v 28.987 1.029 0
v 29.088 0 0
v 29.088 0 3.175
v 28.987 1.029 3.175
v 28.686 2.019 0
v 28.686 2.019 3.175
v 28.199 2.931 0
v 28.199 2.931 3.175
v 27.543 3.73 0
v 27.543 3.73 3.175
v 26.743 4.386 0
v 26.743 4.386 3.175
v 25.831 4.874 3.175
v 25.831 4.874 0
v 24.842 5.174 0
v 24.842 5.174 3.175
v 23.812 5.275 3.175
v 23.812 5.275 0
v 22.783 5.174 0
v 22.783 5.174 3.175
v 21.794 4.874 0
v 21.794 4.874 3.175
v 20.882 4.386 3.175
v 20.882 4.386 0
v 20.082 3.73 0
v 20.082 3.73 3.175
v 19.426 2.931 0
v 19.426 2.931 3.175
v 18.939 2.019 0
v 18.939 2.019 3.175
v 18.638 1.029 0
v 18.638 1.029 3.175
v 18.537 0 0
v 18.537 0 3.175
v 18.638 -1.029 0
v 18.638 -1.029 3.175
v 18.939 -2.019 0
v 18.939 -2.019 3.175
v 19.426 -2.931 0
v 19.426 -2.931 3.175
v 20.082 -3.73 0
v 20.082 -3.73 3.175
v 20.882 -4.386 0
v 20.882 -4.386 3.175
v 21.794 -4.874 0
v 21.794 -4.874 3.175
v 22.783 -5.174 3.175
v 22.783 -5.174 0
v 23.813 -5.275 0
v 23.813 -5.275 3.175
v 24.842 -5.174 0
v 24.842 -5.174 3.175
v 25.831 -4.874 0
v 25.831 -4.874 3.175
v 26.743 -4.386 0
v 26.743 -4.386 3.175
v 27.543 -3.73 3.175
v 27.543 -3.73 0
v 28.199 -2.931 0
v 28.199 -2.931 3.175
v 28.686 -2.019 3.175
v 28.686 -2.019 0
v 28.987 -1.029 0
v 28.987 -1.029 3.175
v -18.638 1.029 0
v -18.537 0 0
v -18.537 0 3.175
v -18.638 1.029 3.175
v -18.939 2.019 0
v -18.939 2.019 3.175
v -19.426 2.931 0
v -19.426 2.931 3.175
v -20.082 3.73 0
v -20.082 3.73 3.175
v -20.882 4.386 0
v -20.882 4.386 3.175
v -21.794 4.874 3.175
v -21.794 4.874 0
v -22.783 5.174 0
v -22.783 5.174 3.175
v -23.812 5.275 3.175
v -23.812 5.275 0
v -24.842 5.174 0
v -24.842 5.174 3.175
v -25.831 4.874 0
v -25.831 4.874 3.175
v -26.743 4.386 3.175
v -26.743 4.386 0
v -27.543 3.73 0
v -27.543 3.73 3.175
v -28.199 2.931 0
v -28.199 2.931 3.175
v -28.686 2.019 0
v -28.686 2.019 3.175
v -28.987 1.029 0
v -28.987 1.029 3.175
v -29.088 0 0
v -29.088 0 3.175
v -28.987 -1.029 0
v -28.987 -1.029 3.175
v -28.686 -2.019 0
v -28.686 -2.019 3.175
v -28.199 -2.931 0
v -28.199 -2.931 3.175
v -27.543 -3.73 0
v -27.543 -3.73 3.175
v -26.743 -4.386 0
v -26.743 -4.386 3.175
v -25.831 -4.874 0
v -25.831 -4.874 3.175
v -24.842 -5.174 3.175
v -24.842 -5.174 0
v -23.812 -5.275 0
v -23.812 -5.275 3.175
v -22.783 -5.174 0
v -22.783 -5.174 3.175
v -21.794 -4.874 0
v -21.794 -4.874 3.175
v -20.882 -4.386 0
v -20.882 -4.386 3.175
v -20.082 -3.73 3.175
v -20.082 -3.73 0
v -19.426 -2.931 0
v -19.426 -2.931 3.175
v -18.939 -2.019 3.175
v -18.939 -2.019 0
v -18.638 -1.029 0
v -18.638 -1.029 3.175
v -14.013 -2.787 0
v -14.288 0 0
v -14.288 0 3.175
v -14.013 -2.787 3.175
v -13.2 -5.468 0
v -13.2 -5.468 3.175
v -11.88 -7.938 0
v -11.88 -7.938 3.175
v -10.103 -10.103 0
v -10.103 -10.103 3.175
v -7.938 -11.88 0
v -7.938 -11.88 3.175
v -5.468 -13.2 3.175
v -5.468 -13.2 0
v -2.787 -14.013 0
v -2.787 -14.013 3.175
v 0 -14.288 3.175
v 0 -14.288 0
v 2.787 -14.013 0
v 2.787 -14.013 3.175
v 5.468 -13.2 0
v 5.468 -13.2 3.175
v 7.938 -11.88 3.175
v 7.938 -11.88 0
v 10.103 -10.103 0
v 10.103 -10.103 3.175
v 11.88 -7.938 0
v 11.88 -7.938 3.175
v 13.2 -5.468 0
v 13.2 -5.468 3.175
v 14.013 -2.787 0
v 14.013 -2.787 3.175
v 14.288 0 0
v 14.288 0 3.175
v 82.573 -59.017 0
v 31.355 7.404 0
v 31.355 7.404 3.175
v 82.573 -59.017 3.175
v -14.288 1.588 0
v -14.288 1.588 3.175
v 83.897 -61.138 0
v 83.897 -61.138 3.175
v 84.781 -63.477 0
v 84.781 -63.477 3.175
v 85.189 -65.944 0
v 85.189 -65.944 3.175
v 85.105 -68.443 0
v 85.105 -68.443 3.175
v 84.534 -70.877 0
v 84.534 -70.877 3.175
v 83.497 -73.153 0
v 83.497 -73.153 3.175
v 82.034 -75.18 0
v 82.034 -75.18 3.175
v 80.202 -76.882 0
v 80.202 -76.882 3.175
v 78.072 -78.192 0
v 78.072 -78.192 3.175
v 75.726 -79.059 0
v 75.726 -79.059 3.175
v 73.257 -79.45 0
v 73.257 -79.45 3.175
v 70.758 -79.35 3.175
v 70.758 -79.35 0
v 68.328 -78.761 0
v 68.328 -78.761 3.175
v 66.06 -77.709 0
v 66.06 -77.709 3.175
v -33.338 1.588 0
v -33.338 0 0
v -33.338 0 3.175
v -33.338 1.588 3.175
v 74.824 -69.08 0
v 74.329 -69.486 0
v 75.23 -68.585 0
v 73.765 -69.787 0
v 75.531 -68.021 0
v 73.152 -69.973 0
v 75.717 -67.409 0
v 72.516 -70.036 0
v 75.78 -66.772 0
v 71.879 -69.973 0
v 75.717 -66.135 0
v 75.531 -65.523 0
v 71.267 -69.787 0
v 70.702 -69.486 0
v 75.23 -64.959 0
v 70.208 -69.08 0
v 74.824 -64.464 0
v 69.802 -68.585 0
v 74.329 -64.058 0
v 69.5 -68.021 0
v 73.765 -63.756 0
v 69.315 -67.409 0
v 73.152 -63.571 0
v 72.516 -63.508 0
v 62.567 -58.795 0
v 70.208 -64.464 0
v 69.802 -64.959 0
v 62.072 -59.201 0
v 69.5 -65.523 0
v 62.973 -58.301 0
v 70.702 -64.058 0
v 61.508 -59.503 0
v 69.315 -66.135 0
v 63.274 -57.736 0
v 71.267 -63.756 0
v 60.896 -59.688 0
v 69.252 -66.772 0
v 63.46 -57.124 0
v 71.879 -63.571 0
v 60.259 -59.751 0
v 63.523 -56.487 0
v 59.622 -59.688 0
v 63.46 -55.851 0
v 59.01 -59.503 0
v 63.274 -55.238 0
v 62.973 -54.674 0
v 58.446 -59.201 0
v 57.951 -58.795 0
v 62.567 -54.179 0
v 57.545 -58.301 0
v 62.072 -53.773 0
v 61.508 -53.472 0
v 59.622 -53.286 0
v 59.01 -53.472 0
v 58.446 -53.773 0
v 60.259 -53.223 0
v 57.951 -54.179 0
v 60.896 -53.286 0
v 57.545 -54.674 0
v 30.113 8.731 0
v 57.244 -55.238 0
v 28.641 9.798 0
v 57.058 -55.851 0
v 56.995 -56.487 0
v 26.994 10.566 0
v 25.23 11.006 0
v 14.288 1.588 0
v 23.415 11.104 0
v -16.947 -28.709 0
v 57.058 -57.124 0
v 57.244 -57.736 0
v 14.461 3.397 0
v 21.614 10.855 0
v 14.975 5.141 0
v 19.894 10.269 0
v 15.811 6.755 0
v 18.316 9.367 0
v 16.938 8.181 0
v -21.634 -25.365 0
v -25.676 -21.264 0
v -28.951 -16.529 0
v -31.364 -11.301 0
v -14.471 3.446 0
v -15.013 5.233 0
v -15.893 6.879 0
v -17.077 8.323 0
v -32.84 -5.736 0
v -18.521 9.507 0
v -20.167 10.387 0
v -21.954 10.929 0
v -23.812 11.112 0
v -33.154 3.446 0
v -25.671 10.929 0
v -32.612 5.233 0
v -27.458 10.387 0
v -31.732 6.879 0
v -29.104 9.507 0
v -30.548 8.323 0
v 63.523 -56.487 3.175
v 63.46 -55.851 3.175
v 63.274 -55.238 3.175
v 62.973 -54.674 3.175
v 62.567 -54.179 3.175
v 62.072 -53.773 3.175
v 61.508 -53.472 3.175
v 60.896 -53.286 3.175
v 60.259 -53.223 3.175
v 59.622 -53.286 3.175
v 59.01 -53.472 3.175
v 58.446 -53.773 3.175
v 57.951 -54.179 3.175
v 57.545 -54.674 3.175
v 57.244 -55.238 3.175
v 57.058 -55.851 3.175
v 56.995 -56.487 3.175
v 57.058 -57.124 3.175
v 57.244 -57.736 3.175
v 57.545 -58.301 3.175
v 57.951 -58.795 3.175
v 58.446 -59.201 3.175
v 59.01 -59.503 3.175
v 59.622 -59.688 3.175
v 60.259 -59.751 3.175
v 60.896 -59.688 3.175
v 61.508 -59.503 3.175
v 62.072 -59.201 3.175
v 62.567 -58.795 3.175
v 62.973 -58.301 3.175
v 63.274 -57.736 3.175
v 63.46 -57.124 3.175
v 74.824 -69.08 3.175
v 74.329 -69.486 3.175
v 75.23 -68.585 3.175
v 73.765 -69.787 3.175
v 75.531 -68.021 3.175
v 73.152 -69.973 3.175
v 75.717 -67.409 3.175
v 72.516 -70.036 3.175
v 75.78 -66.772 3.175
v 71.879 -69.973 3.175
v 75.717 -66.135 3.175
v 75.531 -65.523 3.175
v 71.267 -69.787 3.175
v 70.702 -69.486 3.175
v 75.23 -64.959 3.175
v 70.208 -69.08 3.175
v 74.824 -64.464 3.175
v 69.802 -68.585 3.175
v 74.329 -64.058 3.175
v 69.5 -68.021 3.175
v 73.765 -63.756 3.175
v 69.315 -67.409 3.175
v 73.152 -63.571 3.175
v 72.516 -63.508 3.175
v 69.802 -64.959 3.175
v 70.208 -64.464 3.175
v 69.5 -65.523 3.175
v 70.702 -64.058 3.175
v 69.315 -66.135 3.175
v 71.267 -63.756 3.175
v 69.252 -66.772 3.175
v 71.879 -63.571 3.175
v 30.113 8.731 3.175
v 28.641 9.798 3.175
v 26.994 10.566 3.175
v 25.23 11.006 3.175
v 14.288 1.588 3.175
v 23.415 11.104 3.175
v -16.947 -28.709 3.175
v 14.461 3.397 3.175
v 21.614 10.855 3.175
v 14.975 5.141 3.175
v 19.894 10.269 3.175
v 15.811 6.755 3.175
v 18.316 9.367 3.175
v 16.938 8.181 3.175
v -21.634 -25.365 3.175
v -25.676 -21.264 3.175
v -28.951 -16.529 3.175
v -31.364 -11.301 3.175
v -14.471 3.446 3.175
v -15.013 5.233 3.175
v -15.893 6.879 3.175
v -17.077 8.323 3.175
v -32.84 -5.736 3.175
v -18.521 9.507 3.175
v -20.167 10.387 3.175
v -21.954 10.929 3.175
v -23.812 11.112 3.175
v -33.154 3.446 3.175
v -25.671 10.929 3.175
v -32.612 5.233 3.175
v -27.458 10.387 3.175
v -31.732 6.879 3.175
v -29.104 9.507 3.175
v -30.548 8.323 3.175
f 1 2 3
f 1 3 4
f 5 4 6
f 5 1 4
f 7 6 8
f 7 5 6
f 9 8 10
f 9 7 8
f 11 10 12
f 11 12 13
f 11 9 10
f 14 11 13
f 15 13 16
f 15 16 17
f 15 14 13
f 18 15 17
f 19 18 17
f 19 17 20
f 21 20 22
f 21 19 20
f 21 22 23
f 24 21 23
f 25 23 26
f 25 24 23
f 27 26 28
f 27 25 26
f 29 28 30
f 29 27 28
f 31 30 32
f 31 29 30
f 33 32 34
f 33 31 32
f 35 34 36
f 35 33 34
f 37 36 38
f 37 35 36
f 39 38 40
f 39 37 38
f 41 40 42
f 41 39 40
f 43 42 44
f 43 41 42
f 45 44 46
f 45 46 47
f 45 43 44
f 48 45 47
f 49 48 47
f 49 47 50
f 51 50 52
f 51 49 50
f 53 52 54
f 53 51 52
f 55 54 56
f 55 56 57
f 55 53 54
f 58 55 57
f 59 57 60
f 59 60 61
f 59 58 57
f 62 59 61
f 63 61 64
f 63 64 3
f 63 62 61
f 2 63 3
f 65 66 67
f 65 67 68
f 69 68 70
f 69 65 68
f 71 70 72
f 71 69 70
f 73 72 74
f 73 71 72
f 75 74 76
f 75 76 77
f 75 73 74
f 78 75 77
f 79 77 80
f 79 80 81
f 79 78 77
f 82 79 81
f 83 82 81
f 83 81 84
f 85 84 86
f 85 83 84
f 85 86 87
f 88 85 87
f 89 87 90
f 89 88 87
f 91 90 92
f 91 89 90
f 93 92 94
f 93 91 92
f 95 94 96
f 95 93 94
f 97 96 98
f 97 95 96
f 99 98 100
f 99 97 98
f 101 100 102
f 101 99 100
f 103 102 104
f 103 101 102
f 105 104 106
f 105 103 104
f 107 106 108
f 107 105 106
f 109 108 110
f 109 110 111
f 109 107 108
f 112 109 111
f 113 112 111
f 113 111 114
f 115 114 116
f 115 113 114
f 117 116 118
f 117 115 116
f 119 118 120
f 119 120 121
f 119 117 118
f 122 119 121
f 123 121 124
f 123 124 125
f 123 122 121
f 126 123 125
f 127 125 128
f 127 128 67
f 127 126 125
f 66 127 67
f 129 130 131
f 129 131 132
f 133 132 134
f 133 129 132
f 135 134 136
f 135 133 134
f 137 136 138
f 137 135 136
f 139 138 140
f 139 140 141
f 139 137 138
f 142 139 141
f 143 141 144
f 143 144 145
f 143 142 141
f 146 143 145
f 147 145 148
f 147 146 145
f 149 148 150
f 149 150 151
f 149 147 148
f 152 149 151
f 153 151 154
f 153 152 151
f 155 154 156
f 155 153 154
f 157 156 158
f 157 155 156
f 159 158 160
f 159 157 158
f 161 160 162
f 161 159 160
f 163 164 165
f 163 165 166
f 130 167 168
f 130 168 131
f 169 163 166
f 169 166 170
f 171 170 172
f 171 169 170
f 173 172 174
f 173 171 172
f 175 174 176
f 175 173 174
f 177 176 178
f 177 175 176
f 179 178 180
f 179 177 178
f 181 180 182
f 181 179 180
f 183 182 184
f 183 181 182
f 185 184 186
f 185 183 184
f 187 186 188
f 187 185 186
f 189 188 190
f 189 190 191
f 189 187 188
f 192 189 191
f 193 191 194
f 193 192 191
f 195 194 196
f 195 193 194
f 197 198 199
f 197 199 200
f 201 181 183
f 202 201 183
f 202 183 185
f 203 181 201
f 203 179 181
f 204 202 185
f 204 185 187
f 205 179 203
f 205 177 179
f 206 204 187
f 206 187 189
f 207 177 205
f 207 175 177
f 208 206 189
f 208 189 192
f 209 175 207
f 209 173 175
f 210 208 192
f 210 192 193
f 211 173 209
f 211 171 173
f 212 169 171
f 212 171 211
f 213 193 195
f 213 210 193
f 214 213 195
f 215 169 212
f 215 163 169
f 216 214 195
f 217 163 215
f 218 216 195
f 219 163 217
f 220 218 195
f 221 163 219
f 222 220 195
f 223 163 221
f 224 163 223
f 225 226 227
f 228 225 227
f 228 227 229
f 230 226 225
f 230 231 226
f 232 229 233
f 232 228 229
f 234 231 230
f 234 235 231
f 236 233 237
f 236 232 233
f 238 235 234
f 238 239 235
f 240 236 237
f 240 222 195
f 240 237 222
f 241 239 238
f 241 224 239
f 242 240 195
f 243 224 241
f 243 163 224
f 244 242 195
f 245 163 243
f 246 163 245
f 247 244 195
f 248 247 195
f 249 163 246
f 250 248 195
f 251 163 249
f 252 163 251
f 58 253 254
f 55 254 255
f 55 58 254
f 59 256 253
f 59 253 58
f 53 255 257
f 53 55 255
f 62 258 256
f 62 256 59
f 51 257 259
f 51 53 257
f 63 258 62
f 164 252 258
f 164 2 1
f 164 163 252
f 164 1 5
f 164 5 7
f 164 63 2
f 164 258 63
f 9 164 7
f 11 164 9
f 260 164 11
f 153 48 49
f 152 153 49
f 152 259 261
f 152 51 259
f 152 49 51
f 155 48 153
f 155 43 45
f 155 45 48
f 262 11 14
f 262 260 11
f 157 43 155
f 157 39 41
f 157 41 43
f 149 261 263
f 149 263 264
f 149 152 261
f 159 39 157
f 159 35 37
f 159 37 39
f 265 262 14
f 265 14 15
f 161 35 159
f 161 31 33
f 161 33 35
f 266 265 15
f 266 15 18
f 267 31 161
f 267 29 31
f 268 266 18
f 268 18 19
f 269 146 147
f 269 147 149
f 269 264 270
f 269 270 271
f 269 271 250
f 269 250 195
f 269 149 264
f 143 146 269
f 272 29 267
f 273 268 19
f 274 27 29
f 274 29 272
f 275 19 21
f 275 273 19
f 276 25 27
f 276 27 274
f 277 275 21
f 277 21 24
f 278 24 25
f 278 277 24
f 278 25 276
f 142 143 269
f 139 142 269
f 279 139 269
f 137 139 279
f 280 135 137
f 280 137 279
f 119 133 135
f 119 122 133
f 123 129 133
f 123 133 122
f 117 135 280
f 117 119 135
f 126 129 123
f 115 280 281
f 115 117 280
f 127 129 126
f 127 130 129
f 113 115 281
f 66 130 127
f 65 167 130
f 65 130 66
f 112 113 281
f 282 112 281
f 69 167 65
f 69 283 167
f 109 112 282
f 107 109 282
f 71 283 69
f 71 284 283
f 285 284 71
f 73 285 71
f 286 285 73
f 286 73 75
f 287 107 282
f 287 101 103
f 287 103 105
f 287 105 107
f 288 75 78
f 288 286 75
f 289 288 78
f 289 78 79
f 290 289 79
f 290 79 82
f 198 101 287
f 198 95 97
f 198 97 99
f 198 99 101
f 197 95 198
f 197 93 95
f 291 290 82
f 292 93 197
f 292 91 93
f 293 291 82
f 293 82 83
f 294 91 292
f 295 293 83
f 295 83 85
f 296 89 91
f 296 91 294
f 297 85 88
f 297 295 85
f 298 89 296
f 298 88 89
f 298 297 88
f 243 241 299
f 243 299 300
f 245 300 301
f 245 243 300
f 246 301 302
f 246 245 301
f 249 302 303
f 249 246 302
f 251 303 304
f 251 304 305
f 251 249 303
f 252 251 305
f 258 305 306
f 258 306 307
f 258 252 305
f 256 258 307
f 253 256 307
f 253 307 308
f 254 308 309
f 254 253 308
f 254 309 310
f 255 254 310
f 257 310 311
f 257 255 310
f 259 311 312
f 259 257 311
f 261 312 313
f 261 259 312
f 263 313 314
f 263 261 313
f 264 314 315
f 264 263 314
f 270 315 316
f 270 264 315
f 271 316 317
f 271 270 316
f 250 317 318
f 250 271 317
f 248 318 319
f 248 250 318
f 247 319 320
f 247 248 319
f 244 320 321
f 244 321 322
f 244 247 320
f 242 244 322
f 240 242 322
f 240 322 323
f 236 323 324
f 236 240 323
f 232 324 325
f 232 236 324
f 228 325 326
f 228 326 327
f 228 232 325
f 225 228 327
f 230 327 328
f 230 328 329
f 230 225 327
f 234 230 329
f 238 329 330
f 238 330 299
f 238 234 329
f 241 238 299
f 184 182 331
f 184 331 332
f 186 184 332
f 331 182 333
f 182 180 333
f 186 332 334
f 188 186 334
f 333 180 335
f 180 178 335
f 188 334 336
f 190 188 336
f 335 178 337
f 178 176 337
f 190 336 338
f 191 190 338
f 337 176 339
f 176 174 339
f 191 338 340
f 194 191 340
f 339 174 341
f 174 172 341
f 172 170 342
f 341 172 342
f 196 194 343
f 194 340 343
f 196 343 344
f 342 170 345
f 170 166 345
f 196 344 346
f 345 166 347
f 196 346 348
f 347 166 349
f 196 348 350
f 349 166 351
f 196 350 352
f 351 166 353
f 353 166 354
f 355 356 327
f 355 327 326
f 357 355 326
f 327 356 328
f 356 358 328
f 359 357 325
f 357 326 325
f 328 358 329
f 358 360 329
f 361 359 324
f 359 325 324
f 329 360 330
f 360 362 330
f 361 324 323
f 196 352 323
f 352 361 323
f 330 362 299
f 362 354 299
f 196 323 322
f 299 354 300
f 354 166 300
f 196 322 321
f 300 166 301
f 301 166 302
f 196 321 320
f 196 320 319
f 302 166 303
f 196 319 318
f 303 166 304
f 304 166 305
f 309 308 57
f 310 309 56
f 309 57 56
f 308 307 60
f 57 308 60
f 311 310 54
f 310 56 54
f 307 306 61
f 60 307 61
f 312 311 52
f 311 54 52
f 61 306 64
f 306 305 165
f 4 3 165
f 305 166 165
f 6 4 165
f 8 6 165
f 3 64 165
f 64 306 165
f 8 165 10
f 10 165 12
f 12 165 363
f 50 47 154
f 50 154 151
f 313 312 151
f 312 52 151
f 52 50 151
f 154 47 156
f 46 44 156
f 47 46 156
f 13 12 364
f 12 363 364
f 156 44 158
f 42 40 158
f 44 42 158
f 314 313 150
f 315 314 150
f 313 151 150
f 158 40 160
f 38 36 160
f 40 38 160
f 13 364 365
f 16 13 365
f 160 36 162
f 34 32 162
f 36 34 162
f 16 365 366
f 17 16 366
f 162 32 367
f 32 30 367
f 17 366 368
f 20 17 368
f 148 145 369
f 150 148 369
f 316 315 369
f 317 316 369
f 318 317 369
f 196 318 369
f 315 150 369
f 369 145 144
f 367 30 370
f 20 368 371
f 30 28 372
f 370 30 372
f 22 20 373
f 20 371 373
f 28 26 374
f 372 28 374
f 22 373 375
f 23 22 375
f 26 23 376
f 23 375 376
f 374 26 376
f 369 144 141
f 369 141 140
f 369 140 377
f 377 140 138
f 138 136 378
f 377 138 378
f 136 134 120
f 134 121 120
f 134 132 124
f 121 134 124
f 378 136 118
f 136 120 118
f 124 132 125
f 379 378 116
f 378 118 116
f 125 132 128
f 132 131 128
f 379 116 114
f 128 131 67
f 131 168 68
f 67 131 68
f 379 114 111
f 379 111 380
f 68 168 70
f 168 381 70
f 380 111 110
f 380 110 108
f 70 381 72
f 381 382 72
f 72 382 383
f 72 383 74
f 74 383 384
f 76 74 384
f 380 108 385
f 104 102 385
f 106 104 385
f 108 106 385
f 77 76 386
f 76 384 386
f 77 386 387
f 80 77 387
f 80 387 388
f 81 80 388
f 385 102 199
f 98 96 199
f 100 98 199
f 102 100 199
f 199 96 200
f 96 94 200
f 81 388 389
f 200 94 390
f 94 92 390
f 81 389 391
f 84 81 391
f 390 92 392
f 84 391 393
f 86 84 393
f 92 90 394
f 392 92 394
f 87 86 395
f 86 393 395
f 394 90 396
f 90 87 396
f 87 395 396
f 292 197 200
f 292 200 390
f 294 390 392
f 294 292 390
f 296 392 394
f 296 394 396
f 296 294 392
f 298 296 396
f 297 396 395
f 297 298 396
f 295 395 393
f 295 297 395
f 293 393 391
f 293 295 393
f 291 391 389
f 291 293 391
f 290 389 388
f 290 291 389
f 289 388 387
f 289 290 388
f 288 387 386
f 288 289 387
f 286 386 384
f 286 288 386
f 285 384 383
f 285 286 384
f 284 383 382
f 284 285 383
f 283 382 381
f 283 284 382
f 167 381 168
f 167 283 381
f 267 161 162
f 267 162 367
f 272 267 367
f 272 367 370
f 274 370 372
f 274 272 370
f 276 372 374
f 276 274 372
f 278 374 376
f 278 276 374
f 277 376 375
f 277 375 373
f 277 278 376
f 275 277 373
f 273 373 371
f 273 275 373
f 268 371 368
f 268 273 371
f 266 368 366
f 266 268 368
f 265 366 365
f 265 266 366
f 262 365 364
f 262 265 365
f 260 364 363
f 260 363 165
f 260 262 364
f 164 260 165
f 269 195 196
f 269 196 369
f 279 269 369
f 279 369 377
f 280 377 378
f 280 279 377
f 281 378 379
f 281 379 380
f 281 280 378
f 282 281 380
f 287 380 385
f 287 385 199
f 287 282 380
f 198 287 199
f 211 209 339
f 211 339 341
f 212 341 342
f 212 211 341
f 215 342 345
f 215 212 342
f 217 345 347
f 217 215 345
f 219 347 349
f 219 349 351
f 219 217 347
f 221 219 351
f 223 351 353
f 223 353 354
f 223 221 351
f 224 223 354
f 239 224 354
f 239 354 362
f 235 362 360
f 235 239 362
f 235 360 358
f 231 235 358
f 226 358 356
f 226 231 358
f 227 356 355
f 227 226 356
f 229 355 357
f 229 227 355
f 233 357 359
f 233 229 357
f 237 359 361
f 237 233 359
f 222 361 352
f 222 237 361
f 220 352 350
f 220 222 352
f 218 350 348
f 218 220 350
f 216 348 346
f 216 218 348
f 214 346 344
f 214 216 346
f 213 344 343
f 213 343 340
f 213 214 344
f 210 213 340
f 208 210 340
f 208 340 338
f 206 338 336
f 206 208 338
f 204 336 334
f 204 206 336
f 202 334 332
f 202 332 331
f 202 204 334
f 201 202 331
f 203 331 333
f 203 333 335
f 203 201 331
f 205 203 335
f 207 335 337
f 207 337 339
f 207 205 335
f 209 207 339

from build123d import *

# Parameters (mm, degrees)
SKETCH1_R           = 5.275384615
SKETCH1_R_2         = 3.2639
BOSS_EXTRUDE1_DEPTH = 3.175


with BuildPart() as part:
    # Sketch1 → Boss-Extrude1 (new body)
    with BuildSketch(Plane.XY):
        with BuildLine():
            Line((-14.2875, 1.5875), (-14.2875, 0))
            ThreePointArc((-14.2875, 0), (0, -14.2875), (14.2875, 0))
            Line((14.2875, 0), (14.2875, 1.5875))
            ThreePointArc((14.2875, 1.5875), (20.740075347, 10.603365557), (31.355391181, 7.403892149))
            Line((31.355391181, 7.403892149), (82.572922645, -59.016709578))
            ThreePointArc((82.572922645, -59.016709578), (82.033512438, -75.180341372), (66.05971387, -77.708525595))
            Line((66.05971387, -77.708525595), (-16.947053899, -28.708644524))
            ThreePointArc((-16.947053899, -28.708644524), (-28.951349844, -16.529012325), (-33.3375, 0))
            Line((-33.3375, 0), (-33.3375, 1.5875))
            ThreePointArc((-33.3375, 1.5875), (-23.8125, 11.1125), (-14.2875, 1.5875))
        make_face()
        with Locations((-23.8125, 0)):
            Circle(SKETCH1_R, mode=Mode.SUBTRACT)
        with Locations((23.8125, 0)):
            Circle(SKETCH1_R, mode=Mode.SUBTRACT)
        with Locations((72.515734403, -66.77189911)):
            Circle(SKETCH1_R_2, mode=Mode.SUBTRACT)
        with Locations((60.259023314, -56.487297355)):
            Circle(SKETCH1_R_2, mode=Mode.SUBTRACT)
    extrude(amount=BOSS_EXTRUDE1_DEPTH)


solid = part.part
